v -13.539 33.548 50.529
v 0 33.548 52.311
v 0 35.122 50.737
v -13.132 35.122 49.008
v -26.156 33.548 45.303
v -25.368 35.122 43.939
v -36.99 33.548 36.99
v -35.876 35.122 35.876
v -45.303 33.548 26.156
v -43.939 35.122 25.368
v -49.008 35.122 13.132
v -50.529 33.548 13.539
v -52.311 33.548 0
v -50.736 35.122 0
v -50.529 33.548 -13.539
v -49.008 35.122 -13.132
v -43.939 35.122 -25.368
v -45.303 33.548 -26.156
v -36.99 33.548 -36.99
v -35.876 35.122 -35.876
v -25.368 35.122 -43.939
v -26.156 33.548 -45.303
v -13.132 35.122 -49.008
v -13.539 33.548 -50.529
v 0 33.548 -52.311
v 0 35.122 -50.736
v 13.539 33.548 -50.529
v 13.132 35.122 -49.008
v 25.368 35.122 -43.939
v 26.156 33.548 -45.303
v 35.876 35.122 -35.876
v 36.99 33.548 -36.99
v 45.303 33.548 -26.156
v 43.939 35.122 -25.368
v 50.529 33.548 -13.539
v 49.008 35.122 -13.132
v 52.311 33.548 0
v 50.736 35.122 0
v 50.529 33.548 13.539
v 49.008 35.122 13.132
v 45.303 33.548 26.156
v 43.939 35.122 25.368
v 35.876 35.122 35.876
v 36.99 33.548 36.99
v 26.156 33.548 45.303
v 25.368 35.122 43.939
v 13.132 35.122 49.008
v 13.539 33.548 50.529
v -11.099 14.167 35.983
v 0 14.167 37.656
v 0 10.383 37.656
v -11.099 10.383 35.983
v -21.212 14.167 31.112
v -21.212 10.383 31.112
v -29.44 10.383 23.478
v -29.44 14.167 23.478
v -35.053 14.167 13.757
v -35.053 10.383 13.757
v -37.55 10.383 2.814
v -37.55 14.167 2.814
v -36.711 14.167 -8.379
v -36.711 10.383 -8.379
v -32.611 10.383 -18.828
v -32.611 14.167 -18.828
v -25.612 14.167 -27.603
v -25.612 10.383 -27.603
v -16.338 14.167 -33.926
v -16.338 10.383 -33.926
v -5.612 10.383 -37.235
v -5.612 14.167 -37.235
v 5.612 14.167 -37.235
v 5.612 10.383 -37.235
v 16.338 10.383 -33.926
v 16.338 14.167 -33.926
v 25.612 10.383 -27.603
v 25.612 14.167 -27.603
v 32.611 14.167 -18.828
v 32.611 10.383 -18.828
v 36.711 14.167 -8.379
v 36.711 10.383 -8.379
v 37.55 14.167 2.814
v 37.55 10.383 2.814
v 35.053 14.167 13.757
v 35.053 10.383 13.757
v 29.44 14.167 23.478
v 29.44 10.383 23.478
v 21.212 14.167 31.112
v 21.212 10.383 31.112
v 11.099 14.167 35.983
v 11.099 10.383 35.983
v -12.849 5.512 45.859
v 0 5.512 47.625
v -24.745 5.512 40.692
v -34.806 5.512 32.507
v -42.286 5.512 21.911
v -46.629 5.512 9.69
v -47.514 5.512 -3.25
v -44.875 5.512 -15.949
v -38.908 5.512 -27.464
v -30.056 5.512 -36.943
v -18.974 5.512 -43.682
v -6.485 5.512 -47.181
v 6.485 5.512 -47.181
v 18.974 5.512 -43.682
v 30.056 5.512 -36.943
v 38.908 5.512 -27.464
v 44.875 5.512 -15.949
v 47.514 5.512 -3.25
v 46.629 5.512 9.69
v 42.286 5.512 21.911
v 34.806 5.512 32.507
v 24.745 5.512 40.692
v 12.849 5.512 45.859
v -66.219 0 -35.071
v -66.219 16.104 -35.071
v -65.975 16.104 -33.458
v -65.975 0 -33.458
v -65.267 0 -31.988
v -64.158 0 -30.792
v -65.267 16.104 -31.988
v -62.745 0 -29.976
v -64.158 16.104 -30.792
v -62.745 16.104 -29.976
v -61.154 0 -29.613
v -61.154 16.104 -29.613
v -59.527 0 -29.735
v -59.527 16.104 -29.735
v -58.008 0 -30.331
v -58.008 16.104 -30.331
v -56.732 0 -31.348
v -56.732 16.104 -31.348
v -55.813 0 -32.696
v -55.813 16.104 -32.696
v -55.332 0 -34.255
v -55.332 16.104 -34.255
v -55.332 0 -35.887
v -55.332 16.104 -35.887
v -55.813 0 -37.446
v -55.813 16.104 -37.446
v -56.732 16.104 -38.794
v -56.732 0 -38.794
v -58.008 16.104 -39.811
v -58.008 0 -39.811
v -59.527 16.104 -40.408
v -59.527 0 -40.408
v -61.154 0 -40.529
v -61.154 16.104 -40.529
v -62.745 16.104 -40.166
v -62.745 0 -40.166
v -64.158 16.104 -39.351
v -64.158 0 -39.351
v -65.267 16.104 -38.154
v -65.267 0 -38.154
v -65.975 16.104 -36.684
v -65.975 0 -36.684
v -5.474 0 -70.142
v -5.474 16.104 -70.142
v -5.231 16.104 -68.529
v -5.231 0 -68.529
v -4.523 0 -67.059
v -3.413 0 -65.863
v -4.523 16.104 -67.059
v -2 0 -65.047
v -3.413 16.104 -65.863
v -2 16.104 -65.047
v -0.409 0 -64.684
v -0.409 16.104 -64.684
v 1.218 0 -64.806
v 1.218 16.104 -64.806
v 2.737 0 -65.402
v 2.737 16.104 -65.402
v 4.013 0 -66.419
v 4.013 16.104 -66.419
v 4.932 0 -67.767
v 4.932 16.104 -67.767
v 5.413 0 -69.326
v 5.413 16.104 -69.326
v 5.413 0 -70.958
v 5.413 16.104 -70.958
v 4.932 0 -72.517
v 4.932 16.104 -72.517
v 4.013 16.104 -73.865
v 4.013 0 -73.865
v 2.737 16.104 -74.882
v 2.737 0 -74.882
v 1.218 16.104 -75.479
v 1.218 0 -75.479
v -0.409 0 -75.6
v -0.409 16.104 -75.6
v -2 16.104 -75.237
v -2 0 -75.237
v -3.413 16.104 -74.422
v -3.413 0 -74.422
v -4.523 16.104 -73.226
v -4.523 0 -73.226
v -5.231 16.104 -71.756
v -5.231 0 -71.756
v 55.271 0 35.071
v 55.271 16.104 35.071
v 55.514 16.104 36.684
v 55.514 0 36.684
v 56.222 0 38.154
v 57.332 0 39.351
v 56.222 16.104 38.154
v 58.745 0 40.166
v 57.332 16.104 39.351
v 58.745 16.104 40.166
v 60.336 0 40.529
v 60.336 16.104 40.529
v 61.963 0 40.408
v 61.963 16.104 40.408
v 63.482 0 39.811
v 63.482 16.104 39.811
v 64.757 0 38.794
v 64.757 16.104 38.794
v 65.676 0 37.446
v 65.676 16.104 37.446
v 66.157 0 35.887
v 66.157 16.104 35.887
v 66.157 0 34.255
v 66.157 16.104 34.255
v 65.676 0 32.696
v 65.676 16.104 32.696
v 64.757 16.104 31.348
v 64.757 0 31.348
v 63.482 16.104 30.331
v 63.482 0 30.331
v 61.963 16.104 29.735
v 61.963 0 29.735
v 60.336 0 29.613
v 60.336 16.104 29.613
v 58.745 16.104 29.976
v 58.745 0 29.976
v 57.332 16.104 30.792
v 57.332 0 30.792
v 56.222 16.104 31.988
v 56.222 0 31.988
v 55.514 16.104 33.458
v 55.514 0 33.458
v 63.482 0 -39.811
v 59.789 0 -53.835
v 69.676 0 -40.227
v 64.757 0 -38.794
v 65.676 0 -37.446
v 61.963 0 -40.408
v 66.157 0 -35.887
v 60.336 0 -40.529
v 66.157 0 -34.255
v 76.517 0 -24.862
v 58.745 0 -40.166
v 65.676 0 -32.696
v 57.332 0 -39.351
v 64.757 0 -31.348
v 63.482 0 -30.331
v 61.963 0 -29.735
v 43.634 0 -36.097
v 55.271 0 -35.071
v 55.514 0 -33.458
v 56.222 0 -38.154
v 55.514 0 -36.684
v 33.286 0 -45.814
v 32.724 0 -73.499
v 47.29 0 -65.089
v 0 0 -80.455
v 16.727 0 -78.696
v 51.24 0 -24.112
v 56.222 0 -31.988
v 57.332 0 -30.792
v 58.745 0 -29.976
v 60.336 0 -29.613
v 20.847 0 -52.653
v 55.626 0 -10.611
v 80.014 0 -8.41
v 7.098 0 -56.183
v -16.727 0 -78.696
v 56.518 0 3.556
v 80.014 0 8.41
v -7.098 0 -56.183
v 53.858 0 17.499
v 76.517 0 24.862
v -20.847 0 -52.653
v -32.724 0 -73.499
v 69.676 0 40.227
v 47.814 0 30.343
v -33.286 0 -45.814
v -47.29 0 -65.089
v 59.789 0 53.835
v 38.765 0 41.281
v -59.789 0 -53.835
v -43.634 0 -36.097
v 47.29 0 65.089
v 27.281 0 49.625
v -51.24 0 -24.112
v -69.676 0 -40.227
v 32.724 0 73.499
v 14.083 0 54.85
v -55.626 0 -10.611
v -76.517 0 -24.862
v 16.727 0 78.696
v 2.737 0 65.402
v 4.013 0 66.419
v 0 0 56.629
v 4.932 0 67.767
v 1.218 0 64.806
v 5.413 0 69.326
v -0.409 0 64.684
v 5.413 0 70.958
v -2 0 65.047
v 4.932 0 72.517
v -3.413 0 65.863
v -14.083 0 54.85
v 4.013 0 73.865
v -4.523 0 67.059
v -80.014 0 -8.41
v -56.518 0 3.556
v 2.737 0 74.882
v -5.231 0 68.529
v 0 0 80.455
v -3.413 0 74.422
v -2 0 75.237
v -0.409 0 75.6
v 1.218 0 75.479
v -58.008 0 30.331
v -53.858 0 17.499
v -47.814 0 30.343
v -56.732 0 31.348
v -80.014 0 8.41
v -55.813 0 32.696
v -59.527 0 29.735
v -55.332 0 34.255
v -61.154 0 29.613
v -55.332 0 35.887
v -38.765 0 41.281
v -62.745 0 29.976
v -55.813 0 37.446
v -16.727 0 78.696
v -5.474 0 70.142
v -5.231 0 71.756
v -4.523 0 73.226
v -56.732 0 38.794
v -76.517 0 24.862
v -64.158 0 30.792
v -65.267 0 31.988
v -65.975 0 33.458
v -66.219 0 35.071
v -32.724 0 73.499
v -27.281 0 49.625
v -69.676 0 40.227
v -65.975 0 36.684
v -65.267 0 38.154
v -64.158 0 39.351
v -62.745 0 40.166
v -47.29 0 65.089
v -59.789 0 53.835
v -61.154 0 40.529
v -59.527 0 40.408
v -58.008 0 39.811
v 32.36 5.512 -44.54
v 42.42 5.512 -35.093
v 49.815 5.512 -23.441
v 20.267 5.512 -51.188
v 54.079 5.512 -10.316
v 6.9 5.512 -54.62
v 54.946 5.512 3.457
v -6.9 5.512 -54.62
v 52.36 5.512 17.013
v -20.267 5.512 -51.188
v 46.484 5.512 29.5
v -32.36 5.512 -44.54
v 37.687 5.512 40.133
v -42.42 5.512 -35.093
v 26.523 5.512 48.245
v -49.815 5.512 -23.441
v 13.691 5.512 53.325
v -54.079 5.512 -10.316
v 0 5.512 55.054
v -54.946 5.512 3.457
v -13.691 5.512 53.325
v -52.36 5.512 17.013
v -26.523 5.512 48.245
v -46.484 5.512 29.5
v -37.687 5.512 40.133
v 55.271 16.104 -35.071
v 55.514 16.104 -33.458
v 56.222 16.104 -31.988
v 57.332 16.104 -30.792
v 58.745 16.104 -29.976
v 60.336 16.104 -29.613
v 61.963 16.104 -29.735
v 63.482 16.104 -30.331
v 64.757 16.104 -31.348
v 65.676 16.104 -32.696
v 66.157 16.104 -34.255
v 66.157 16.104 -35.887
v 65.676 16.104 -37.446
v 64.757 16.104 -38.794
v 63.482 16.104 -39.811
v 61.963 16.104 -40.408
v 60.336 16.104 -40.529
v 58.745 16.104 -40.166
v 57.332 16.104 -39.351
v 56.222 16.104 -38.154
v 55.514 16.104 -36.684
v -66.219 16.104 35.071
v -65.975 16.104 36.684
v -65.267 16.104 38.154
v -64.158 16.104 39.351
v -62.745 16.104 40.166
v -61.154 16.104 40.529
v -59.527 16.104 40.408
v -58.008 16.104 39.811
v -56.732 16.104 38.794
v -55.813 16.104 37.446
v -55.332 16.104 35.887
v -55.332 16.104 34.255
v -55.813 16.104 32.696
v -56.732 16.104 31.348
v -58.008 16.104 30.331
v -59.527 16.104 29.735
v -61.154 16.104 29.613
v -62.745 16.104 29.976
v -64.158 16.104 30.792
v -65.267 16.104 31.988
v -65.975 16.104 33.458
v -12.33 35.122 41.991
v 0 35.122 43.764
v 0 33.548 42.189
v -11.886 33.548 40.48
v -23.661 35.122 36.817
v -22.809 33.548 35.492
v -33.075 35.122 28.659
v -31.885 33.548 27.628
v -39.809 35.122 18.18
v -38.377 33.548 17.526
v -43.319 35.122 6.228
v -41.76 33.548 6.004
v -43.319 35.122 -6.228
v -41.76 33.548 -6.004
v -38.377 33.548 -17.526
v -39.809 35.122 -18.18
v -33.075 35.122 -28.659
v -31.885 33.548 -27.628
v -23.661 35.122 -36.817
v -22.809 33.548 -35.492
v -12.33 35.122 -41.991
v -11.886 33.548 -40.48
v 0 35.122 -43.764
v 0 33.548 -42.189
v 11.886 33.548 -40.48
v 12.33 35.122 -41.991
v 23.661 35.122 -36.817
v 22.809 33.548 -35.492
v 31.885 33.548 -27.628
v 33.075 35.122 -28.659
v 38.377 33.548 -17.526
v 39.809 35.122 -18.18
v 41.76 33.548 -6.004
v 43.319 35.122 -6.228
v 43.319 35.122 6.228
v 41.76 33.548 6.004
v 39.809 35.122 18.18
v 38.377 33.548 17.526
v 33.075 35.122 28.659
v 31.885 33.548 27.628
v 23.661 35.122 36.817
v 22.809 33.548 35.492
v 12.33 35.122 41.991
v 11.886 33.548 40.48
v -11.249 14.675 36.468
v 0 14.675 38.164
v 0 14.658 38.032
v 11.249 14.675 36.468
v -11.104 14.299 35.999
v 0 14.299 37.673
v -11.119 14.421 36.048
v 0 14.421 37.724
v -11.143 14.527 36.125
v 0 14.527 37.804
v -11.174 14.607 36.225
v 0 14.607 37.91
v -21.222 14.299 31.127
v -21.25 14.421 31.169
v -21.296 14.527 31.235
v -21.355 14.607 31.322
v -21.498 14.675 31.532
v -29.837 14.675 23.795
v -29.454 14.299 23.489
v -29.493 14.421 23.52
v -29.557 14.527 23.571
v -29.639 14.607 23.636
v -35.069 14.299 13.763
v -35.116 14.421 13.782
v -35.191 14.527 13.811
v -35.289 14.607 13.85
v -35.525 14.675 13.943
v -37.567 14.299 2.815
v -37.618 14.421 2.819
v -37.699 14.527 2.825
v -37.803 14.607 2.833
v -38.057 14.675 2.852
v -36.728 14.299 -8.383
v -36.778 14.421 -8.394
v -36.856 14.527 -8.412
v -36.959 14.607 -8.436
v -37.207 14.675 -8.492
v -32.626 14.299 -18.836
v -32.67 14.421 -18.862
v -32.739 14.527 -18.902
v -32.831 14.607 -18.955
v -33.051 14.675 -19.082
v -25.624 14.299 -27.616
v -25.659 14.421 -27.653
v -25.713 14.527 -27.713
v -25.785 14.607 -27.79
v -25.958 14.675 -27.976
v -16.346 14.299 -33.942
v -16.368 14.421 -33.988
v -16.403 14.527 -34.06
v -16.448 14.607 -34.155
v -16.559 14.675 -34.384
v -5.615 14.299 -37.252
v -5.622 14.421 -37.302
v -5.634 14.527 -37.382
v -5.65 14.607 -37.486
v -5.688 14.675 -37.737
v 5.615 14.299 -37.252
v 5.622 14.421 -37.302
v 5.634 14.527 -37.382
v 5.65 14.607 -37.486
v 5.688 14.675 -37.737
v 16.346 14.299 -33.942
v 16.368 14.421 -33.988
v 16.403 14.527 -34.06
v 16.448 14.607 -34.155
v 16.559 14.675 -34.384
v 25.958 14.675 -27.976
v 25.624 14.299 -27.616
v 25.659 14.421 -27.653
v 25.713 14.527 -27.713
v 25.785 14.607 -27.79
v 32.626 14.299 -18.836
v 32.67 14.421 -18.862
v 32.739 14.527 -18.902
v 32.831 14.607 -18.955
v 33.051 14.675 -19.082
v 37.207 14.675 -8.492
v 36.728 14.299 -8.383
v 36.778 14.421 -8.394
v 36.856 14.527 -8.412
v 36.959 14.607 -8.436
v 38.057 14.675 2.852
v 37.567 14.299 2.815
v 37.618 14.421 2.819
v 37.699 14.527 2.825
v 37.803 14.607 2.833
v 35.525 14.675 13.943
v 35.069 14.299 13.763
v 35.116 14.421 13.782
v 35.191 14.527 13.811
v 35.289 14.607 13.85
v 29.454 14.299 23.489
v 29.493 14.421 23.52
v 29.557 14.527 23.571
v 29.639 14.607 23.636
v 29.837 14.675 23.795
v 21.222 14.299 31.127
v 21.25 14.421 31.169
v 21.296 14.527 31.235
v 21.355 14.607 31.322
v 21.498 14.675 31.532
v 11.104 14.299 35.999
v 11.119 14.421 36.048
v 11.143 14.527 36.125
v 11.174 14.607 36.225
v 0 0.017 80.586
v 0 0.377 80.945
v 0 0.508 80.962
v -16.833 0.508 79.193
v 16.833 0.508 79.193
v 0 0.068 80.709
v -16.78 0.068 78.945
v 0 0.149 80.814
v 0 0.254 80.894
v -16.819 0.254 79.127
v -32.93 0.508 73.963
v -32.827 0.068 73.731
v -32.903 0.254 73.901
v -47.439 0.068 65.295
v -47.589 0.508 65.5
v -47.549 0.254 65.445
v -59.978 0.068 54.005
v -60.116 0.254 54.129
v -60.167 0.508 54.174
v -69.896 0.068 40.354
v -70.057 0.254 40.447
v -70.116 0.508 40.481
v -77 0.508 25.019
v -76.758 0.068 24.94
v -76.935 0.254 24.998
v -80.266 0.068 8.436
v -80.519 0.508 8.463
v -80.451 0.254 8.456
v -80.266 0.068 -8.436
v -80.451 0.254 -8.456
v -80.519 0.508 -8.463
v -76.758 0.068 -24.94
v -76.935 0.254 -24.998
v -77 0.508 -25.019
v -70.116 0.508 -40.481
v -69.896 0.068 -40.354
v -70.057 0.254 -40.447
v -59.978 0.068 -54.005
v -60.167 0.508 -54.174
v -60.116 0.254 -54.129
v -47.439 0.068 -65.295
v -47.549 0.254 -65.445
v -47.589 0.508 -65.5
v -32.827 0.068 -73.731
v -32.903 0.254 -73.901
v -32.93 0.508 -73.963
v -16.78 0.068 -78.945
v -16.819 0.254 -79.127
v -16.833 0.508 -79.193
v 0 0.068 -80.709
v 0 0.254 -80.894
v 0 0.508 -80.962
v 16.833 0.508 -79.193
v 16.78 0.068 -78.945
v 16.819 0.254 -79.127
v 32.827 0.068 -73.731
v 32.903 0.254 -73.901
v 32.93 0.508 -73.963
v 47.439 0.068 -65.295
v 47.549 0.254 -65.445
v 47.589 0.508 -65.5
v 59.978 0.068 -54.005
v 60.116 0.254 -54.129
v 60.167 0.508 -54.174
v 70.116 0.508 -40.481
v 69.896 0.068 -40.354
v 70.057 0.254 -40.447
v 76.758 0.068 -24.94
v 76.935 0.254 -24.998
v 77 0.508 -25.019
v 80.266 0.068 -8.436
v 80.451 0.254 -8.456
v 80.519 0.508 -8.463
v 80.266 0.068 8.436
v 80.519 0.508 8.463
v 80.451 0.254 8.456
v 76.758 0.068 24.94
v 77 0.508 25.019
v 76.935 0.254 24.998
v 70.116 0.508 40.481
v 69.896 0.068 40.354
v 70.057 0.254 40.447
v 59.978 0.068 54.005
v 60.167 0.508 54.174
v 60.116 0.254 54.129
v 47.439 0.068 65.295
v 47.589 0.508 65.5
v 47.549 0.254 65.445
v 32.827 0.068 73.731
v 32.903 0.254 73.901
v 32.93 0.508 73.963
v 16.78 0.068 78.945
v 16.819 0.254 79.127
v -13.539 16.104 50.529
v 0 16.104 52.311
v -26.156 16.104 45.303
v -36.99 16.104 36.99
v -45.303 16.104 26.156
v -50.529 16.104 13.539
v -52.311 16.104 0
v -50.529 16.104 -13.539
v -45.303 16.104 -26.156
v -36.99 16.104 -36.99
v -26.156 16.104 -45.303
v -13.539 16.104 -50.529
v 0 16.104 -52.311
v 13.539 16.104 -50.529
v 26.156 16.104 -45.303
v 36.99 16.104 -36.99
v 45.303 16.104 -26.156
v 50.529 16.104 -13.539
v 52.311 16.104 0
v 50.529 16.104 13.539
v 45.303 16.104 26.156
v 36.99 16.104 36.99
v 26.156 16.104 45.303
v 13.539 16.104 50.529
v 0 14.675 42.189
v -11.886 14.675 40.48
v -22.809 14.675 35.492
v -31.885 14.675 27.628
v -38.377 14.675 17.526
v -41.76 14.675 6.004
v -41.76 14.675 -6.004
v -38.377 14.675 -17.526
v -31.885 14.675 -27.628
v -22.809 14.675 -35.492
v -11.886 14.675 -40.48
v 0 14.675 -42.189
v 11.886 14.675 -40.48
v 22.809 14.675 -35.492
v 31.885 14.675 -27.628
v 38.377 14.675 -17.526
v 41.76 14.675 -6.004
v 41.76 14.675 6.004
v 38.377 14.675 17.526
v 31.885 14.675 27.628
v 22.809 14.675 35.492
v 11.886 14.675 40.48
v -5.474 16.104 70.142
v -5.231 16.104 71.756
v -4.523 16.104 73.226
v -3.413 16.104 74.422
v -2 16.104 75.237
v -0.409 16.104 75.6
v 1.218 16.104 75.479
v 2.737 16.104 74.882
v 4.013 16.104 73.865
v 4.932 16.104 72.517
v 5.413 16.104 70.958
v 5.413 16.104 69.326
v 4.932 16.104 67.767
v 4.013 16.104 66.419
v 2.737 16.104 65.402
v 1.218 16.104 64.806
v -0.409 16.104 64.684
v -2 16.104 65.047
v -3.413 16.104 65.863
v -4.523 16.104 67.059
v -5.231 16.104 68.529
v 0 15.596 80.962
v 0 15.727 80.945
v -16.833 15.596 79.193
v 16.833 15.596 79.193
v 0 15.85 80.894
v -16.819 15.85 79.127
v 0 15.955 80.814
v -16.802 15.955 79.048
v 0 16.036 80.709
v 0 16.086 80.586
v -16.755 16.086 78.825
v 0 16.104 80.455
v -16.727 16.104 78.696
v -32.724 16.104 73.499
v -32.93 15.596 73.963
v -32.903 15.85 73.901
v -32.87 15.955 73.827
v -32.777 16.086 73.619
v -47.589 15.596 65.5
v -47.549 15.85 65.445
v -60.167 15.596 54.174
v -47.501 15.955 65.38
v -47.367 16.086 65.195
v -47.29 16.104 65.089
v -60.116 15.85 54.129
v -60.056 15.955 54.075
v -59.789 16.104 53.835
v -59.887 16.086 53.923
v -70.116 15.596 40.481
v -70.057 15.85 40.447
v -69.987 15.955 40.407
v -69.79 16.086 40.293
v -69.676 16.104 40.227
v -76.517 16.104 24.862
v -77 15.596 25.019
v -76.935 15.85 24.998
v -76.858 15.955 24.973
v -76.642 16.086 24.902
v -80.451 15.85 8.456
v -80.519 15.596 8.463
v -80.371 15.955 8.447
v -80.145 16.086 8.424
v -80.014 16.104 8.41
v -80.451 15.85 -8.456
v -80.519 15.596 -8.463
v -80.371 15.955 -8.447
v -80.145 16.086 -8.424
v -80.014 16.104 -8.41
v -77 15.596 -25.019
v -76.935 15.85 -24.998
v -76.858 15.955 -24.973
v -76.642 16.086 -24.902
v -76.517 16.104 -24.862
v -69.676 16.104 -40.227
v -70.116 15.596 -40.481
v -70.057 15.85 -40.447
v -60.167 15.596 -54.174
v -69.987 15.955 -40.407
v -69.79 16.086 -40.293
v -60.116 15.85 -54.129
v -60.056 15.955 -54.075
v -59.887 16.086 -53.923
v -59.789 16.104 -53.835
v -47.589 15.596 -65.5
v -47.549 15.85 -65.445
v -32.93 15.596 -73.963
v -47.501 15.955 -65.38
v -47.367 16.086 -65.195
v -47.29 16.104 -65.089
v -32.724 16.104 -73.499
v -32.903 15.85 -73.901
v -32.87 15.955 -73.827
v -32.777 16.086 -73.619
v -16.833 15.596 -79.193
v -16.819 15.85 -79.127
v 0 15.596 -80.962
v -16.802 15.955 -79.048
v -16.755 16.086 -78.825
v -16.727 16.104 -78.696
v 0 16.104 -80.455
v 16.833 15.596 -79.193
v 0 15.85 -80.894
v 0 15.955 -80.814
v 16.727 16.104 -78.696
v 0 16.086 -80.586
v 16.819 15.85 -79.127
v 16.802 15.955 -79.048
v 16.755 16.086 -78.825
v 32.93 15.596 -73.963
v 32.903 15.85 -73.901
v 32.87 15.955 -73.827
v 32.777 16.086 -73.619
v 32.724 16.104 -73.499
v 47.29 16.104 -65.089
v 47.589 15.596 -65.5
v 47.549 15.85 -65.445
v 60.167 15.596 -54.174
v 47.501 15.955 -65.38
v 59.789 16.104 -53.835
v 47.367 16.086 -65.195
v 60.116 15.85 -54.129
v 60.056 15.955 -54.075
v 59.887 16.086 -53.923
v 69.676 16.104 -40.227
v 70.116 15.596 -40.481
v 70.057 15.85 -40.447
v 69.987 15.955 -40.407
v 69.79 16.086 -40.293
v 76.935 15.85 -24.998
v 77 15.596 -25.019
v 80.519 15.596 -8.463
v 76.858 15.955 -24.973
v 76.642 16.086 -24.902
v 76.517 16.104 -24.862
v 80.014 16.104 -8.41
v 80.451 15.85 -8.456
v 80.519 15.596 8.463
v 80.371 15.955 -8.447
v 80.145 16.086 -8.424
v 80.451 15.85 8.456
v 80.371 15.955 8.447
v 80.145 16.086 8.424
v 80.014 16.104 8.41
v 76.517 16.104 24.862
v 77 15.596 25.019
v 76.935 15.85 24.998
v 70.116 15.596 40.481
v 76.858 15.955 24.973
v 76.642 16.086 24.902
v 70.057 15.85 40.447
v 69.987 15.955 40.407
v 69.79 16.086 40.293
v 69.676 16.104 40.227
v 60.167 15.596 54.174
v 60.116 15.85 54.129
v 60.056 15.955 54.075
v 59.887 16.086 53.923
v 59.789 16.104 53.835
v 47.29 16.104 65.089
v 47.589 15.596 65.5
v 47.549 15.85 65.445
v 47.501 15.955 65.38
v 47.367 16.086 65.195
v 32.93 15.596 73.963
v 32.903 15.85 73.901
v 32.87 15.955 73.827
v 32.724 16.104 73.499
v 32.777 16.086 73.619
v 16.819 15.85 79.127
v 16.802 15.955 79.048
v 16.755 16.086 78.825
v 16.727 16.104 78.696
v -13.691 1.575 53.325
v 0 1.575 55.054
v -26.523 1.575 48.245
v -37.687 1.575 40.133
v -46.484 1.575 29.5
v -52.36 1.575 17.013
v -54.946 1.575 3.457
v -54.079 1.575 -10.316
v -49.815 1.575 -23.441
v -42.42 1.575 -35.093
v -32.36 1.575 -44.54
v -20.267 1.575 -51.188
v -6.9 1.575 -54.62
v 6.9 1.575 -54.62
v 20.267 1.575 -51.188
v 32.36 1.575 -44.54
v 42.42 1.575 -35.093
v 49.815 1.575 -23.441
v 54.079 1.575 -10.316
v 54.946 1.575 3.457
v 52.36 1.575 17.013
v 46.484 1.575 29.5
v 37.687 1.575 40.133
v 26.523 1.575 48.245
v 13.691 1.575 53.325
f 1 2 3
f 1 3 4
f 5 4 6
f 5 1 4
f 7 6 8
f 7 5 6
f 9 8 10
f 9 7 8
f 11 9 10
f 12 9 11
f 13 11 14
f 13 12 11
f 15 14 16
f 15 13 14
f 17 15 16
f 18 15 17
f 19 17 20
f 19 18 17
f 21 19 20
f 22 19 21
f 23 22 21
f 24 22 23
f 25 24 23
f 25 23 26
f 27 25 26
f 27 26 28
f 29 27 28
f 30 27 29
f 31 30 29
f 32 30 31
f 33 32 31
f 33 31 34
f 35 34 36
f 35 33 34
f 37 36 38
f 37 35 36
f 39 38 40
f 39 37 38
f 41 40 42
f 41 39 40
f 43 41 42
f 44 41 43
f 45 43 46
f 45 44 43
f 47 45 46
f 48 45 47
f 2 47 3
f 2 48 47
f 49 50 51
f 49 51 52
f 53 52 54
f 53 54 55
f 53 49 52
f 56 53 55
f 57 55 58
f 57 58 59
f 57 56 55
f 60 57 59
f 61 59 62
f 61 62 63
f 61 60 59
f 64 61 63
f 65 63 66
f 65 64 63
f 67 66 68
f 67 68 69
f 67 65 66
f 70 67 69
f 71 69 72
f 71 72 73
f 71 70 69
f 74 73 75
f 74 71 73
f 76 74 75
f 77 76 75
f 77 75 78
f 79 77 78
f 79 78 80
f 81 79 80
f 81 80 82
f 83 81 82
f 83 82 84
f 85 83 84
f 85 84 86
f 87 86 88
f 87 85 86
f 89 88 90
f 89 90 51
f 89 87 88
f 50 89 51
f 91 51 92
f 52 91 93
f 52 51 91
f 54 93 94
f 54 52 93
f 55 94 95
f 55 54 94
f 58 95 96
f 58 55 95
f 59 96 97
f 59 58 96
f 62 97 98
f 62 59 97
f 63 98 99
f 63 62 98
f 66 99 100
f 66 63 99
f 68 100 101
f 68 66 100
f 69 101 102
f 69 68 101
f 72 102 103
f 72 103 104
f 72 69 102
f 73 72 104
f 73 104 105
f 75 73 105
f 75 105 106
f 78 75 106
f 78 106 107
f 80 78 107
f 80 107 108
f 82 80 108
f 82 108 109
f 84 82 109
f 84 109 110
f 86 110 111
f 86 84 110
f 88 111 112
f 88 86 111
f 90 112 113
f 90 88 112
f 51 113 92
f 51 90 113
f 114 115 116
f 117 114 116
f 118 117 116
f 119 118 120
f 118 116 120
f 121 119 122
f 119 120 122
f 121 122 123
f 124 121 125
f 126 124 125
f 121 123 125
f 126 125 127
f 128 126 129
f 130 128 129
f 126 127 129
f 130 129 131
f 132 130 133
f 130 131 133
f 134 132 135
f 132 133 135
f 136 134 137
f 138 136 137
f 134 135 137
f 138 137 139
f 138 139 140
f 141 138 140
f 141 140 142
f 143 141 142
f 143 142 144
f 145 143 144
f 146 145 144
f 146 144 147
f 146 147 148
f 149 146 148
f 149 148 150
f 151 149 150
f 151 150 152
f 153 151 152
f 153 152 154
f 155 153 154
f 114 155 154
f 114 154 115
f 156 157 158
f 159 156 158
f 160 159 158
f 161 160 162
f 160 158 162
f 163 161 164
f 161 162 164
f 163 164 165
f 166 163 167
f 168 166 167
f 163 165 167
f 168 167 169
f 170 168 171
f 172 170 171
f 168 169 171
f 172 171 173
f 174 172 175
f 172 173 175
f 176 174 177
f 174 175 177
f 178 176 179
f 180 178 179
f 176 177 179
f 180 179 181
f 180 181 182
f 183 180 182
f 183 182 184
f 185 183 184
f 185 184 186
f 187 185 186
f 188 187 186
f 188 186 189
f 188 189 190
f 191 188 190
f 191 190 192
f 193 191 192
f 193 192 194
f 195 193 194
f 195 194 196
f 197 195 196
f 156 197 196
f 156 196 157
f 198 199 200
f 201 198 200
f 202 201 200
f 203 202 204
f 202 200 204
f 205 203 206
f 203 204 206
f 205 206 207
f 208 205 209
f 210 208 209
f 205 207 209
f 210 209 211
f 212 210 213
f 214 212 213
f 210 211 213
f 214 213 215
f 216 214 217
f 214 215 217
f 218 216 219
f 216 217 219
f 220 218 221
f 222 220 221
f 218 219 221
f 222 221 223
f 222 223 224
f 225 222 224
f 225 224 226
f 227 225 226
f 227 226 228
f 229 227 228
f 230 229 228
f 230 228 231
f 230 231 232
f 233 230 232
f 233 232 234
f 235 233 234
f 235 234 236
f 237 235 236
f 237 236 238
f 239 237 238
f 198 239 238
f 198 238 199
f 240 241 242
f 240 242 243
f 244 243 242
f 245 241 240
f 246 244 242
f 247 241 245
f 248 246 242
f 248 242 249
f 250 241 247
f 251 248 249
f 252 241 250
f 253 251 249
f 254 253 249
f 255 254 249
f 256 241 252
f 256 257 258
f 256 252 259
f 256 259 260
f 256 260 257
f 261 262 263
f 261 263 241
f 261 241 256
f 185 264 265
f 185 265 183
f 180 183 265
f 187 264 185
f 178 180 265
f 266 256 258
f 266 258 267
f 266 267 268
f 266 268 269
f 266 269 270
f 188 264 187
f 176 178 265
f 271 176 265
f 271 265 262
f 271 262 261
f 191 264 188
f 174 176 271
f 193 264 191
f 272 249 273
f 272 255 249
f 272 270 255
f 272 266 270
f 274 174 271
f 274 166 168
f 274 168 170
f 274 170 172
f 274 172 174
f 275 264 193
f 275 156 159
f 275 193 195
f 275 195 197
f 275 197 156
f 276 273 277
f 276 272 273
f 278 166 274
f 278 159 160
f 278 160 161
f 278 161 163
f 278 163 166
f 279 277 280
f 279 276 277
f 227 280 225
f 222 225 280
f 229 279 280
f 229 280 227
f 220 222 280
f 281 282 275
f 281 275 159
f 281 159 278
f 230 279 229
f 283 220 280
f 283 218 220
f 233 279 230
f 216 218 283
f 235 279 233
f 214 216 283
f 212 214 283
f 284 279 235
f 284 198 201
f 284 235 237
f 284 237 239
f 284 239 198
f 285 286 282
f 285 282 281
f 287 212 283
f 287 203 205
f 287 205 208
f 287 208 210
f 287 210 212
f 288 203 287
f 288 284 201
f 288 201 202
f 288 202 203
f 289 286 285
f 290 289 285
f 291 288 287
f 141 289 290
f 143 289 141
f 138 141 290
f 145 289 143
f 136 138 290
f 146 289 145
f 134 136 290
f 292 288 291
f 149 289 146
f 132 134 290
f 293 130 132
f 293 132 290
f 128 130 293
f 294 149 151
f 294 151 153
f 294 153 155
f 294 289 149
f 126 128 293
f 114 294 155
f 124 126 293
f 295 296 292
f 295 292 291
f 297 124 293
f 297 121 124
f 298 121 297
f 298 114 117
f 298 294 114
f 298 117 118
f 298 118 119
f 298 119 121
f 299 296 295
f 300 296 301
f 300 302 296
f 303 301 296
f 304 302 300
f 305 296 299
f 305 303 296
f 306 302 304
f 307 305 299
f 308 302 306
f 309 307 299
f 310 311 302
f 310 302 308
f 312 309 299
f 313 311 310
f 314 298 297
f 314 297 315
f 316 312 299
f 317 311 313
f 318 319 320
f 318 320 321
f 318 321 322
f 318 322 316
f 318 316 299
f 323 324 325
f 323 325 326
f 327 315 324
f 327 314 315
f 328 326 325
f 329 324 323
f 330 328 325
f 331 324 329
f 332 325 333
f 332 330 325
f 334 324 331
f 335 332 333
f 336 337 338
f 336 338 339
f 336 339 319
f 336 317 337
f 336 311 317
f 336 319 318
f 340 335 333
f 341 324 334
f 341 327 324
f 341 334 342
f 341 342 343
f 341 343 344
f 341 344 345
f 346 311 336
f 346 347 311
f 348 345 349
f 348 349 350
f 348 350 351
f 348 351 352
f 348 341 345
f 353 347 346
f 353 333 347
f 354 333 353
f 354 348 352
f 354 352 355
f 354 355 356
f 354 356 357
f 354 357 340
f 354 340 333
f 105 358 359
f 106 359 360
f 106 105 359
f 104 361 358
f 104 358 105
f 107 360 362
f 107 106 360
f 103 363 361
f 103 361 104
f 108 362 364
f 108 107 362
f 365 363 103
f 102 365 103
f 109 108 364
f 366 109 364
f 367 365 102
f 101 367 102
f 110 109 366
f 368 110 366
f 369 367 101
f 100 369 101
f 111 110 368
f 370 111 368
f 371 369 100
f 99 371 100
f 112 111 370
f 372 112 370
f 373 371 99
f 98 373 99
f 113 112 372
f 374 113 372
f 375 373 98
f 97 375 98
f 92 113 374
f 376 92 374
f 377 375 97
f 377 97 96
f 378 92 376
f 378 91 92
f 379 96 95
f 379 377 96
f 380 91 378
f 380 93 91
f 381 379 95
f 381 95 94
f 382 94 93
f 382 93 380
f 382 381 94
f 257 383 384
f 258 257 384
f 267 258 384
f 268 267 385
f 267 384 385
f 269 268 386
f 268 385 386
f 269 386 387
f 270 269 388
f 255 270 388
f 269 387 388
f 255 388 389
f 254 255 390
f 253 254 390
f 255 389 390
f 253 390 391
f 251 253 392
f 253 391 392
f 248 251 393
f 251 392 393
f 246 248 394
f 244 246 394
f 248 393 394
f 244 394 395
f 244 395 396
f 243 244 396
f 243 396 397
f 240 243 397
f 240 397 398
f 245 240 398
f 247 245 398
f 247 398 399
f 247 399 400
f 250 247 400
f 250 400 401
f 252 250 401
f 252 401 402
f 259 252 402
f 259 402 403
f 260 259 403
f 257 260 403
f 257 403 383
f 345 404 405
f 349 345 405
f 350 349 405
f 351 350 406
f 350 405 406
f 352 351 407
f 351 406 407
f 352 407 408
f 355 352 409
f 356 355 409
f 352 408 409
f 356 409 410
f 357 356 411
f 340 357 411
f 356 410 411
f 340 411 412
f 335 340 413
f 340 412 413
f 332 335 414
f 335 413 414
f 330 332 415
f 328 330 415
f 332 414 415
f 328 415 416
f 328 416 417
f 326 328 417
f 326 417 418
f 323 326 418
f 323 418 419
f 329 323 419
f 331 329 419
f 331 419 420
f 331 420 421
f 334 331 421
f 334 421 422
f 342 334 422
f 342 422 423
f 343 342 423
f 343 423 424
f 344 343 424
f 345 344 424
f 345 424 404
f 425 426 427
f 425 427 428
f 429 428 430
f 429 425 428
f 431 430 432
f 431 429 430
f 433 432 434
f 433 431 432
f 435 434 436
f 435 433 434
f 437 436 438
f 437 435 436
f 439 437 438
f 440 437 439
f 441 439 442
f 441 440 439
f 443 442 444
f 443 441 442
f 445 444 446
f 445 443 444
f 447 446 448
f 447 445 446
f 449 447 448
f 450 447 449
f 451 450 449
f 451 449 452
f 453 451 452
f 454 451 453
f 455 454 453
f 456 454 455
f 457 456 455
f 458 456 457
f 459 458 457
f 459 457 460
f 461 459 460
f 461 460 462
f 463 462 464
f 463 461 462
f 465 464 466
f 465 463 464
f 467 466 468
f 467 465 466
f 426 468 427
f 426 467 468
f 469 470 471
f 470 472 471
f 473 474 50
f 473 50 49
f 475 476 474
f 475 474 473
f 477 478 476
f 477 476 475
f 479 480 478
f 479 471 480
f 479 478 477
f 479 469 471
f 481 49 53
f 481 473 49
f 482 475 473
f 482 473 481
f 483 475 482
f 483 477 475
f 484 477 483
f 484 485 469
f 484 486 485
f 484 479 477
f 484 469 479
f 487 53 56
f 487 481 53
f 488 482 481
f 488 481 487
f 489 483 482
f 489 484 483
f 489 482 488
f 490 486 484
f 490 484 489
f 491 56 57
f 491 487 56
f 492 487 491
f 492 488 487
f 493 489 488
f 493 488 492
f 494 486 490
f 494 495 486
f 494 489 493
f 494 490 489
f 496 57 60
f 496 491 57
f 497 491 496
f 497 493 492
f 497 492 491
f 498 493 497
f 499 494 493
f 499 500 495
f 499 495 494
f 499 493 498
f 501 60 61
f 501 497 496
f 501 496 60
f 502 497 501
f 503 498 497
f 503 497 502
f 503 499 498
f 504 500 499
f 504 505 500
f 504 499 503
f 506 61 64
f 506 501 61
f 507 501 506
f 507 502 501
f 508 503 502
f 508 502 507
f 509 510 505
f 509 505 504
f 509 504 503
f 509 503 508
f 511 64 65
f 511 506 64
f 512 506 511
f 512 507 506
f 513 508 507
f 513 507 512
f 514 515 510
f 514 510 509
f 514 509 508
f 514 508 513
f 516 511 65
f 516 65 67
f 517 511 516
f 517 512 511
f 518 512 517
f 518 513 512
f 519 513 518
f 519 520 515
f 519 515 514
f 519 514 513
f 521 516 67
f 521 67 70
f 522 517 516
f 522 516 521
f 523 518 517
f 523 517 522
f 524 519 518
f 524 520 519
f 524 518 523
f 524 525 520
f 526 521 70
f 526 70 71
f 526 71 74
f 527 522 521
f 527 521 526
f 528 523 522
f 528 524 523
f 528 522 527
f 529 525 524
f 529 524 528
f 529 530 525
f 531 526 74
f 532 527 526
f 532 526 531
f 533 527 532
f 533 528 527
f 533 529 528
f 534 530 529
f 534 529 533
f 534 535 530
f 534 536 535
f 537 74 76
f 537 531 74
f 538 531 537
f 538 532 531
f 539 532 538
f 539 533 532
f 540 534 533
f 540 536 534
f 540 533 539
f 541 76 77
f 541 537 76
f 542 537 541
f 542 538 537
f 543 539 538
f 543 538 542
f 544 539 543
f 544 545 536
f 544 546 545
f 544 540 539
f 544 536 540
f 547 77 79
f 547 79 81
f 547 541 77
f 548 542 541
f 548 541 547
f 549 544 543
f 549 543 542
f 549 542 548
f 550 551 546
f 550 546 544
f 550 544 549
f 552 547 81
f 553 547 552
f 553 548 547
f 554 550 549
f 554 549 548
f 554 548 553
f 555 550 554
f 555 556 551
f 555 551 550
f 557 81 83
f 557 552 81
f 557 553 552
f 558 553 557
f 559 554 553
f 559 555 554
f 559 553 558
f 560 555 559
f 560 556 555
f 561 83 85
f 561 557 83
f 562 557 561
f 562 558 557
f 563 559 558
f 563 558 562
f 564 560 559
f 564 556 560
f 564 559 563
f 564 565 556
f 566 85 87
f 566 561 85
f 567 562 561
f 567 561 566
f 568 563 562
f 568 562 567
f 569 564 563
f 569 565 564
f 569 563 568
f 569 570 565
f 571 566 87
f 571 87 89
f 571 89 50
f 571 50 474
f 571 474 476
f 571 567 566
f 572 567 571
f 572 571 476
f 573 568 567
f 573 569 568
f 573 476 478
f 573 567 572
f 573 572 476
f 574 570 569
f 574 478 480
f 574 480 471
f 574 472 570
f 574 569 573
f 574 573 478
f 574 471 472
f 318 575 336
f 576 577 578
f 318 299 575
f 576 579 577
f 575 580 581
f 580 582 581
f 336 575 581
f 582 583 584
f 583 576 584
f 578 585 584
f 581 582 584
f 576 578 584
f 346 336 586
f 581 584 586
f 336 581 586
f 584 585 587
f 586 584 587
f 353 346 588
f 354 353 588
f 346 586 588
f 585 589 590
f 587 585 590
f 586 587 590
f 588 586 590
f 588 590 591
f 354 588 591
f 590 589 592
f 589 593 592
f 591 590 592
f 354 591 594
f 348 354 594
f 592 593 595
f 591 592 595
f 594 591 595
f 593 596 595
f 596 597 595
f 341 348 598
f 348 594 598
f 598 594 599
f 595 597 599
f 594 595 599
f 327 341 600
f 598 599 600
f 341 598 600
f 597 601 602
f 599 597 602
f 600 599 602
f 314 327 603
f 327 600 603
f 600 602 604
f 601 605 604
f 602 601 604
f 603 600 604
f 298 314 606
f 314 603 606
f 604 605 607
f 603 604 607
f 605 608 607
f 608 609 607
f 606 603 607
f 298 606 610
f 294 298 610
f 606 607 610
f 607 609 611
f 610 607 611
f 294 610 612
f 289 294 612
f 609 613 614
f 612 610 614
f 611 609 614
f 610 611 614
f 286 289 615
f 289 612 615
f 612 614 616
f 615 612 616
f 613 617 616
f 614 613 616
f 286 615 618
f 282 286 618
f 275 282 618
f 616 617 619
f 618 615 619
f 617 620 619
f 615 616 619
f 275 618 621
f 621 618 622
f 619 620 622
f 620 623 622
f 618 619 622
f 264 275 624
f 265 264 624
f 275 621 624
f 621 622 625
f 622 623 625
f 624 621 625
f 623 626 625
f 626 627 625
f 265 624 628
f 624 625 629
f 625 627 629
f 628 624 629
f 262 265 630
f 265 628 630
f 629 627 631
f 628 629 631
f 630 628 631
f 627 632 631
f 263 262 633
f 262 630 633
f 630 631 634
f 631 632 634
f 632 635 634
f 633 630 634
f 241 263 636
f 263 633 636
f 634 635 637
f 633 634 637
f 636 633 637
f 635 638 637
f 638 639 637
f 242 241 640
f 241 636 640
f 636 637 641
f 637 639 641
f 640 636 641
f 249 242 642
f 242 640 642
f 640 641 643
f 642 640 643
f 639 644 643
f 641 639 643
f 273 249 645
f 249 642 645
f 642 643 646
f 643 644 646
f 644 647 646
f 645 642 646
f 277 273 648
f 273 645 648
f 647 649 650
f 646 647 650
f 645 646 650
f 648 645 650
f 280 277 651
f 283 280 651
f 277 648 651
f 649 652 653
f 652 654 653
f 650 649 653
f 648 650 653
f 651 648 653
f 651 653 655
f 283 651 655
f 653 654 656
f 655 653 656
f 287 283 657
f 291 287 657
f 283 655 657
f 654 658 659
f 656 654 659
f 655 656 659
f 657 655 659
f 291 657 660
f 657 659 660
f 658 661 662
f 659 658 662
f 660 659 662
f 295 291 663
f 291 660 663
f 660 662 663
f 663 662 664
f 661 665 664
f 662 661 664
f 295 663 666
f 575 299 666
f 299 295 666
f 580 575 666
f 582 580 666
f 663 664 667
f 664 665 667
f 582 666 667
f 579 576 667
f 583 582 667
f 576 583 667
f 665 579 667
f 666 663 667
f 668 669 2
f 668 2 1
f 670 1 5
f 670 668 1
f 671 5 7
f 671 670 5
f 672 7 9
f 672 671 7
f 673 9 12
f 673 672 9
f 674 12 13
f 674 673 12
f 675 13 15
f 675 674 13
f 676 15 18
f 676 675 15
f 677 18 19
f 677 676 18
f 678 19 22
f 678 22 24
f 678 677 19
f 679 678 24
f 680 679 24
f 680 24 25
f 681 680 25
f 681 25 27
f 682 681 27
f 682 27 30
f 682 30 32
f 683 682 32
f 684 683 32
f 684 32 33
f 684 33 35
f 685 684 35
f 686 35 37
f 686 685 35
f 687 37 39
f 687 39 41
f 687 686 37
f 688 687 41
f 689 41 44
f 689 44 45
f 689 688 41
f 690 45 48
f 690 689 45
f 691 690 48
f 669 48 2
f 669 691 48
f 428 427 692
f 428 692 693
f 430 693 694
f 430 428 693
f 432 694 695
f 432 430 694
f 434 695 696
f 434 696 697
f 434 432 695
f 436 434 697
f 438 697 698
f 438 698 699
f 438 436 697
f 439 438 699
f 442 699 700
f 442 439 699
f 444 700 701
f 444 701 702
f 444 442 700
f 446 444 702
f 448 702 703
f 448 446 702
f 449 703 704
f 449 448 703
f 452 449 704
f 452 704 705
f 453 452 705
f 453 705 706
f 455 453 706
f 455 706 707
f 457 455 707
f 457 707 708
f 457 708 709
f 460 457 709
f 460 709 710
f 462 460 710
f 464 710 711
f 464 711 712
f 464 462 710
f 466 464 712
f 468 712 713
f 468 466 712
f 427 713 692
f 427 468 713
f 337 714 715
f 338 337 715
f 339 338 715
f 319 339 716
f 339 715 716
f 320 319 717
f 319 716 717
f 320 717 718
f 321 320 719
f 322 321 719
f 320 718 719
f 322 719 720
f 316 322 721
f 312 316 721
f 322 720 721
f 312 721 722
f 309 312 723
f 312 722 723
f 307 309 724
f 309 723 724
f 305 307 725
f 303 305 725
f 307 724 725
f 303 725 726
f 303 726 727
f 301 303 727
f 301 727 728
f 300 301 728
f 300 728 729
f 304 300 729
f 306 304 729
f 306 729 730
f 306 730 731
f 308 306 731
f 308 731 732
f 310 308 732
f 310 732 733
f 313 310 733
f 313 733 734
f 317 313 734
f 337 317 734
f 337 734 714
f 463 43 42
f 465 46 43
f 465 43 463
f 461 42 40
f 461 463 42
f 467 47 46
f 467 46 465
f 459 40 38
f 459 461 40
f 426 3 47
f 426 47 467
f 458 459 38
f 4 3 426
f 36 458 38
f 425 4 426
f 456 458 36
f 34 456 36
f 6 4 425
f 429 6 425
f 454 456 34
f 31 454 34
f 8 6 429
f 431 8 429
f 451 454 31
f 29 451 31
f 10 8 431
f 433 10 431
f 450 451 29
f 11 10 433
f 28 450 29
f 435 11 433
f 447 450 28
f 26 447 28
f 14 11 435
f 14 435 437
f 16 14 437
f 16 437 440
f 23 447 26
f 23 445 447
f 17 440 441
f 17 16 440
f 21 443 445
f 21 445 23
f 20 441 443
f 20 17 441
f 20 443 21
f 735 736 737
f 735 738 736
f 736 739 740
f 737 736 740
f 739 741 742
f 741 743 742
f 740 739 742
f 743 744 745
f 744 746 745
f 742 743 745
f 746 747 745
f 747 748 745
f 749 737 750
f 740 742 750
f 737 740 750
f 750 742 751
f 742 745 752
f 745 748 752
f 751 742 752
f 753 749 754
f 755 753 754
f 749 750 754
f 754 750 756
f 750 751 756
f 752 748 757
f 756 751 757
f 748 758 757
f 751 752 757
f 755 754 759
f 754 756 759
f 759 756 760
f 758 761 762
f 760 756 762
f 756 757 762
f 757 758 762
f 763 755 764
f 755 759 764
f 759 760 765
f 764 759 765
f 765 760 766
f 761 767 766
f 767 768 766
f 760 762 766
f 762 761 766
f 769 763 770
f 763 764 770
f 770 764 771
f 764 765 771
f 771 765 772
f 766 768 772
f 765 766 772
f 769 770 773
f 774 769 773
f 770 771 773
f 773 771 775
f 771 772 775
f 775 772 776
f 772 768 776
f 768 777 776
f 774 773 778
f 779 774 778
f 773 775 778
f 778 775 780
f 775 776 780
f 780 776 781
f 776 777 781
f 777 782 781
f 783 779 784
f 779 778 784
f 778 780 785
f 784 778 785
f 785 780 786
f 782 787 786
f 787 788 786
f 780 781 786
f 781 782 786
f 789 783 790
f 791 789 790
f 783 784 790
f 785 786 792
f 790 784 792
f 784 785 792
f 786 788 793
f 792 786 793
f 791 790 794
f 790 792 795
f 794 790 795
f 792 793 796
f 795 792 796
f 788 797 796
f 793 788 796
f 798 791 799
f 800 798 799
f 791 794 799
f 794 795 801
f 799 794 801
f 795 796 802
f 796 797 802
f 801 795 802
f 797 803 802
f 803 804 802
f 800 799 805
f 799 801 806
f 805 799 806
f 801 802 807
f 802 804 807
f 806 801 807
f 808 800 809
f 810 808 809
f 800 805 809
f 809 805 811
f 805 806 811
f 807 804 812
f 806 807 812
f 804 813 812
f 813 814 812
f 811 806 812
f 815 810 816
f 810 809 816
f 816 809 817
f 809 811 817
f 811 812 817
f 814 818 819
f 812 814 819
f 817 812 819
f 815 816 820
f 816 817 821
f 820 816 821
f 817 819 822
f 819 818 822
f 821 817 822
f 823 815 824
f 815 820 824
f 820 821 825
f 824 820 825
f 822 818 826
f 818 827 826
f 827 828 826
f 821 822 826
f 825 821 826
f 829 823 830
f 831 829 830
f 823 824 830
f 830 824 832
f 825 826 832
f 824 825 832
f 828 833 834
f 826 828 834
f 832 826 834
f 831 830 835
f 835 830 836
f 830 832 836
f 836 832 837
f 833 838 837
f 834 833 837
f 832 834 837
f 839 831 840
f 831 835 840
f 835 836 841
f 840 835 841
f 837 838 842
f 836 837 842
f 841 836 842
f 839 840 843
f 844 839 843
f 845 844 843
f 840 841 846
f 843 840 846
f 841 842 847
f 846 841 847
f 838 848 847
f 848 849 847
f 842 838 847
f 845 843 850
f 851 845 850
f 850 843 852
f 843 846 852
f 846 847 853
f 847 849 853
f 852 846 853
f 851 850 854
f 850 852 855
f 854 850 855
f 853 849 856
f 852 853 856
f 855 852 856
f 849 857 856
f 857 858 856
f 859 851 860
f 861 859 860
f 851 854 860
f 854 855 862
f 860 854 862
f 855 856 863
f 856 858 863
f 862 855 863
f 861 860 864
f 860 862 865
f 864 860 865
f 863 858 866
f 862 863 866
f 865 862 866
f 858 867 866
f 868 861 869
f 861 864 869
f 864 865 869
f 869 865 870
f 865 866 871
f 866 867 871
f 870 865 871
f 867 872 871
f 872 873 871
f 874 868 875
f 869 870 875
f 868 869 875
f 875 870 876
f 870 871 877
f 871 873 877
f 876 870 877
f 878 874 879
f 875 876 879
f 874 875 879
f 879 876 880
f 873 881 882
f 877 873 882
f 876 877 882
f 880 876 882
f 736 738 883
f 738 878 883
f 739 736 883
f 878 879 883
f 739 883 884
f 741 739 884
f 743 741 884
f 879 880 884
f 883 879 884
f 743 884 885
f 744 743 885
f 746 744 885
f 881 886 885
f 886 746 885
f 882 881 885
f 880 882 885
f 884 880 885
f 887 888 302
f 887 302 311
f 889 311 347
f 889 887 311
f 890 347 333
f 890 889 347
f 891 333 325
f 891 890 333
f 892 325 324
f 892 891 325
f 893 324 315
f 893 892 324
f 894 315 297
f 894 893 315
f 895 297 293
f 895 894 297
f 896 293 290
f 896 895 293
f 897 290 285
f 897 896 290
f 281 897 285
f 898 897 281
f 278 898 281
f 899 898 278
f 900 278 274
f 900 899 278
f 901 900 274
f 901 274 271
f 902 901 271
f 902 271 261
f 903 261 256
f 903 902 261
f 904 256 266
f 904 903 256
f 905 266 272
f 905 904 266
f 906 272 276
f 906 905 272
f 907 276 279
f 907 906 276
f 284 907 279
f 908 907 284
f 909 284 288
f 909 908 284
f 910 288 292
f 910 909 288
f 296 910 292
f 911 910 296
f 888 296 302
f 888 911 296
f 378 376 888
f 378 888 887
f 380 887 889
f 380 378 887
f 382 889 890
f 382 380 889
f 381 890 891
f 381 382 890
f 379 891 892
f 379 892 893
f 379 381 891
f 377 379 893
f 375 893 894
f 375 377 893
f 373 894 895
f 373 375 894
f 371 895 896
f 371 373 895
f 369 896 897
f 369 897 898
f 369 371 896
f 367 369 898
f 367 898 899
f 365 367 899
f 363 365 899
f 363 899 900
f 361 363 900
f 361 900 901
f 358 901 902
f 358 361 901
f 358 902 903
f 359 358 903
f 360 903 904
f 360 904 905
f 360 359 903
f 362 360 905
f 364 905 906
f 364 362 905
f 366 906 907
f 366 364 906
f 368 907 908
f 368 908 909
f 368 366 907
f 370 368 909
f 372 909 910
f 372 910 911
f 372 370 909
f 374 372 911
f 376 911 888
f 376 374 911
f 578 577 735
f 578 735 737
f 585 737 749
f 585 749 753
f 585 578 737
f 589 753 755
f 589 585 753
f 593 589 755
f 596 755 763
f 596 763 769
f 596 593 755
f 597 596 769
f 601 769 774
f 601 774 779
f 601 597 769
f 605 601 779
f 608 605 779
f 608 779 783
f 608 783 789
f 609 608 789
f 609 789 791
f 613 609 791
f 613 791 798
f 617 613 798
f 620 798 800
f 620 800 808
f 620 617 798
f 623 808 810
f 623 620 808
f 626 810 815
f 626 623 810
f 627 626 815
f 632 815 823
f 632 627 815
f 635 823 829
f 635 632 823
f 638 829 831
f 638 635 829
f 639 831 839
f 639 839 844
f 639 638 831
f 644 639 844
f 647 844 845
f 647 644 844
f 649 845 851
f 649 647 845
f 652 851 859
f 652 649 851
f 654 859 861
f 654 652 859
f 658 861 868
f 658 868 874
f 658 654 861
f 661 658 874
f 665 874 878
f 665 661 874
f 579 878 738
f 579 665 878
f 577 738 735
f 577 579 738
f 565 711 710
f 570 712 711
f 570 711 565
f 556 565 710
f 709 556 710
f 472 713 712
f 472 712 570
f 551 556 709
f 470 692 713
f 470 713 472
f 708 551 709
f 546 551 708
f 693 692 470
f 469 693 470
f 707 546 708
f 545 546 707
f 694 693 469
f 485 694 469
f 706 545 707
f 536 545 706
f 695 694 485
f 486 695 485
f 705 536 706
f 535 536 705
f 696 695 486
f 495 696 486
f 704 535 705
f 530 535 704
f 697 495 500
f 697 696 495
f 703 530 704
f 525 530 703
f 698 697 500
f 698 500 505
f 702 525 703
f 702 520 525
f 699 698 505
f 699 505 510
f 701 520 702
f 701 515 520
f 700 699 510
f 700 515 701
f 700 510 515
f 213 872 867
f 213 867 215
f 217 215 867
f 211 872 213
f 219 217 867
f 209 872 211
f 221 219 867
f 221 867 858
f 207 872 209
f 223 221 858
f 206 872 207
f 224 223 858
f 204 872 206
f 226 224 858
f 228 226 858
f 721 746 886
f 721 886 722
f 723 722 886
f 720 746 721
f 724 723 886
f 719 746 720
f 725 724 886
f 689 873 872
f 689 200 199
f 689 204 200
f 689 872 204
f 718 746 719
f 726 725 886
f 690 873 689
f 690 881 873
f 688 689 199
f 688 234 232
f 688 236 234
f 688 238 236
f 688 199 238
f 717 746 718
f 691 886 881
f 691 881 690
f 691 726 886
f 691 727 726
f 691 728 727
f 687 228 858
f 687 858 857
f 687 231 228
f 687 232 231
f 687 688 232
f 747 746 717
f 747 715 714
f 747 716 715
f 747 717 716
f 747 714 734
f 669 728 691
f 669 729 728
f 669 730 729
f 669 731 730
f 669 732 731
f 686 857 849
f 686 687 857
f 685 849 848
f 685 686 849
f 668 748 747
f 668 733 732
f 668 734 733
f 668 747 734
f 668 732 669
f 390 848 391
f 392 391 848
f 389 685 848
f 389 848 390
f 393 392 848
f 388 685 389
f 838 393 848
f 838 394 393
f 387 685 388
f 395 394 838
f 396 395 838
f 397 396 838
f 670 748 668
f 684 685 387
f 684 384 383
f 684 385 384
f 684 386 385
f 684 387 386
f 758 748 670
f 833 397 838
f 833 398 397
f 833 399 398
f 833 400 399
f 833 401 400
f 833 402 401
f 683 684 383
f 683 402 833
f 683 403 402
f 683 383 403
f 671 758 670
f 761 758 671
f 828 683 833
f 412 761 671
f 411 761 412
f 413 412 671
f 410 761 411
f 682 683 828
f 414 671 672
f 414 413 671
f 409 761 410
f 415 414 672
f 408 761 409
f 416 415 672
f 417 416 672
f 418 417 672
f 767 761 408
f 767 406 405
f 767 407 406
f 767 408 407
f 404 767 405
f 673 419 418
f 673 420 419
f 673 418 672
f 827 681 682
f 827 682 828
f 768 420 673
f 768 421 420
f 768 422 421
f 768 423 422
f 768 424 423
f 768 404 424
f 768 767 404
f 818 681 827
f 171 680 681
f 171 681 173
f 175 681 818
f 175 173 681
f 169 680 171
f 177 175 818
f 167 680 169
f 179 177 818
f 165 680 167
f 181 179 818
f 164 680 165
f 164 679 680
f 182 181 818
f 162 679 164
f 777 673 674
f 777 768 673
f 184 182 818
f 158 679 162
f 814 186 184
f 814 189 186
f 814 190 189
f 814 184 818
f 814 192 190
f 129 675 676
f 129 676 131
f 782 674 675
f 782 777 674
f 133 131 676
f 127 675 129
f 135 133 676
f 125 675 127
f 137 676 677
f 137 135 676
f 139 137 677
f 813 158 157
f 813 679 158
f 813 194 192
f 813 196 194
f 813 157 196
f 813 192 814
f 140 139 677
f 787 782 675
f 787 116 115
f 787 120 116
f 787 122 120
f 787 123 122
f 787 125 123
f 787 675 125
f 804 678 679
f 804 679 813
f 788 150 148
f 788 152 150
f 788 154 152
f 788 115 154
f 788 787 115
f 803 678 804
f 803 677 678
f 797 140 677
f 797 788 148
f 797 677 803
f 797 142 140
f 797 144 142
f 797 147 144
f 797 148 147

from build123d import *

# Parameters (mm, degrees)
F2_SIZE = 1.5748
F3_R    = 0.508
F5_D    = 10.9474


with BuildPart() as f1:
    # F0 (on Right) → F1 (revolve)
    with BuildSketch(Plane.YZ):
        Polygon((16.1036, 80.9625), (0, 80.9625), (0, 55.0545), (5.5118, 55.0545), (5.5118, 47.625), (10.382705, 37.6555), (14.675305, 37.6555), (14.675305, 42.1894), (35.122305, 42.1894), (35.122305, 52.3113), (16.1036, 52.3113), align=None)
    revolve(axis=Axis((0, 17.561152, 0), (0, -1, 0)))

    # F2
    f2_edges = [f1.edges().sort_by_distance(p)[0] for p in [
        (0, 35.122305, -42.1894),
        (0, 35.122305, -52.3113),
        (0, 0, -55.0545),
    ]]
    chamfer(f2_edges, length=F2_SIZE)

    # F3
    f3_edges = [f1.edges().sort_by_distance(p)[0] for p in [
        (0, 14.675305, -37.6555),
        (0, 16.1036, -80.9625),
        (0, 0, -80.9625),
    ]]
    fillet(f3_edges, radius=F3_R)

    # F5 (through all)
    with Locations(Plane.XZ):
        with Locations((0, 70.1421), (60.74484, 35.07105), (60.74484, -35.07105), (0, -70.1421), (-60.74484, -35.07105), (-60.74484, 35.07105)):
            Hole(F5_D / 2)


solid = f1.part
